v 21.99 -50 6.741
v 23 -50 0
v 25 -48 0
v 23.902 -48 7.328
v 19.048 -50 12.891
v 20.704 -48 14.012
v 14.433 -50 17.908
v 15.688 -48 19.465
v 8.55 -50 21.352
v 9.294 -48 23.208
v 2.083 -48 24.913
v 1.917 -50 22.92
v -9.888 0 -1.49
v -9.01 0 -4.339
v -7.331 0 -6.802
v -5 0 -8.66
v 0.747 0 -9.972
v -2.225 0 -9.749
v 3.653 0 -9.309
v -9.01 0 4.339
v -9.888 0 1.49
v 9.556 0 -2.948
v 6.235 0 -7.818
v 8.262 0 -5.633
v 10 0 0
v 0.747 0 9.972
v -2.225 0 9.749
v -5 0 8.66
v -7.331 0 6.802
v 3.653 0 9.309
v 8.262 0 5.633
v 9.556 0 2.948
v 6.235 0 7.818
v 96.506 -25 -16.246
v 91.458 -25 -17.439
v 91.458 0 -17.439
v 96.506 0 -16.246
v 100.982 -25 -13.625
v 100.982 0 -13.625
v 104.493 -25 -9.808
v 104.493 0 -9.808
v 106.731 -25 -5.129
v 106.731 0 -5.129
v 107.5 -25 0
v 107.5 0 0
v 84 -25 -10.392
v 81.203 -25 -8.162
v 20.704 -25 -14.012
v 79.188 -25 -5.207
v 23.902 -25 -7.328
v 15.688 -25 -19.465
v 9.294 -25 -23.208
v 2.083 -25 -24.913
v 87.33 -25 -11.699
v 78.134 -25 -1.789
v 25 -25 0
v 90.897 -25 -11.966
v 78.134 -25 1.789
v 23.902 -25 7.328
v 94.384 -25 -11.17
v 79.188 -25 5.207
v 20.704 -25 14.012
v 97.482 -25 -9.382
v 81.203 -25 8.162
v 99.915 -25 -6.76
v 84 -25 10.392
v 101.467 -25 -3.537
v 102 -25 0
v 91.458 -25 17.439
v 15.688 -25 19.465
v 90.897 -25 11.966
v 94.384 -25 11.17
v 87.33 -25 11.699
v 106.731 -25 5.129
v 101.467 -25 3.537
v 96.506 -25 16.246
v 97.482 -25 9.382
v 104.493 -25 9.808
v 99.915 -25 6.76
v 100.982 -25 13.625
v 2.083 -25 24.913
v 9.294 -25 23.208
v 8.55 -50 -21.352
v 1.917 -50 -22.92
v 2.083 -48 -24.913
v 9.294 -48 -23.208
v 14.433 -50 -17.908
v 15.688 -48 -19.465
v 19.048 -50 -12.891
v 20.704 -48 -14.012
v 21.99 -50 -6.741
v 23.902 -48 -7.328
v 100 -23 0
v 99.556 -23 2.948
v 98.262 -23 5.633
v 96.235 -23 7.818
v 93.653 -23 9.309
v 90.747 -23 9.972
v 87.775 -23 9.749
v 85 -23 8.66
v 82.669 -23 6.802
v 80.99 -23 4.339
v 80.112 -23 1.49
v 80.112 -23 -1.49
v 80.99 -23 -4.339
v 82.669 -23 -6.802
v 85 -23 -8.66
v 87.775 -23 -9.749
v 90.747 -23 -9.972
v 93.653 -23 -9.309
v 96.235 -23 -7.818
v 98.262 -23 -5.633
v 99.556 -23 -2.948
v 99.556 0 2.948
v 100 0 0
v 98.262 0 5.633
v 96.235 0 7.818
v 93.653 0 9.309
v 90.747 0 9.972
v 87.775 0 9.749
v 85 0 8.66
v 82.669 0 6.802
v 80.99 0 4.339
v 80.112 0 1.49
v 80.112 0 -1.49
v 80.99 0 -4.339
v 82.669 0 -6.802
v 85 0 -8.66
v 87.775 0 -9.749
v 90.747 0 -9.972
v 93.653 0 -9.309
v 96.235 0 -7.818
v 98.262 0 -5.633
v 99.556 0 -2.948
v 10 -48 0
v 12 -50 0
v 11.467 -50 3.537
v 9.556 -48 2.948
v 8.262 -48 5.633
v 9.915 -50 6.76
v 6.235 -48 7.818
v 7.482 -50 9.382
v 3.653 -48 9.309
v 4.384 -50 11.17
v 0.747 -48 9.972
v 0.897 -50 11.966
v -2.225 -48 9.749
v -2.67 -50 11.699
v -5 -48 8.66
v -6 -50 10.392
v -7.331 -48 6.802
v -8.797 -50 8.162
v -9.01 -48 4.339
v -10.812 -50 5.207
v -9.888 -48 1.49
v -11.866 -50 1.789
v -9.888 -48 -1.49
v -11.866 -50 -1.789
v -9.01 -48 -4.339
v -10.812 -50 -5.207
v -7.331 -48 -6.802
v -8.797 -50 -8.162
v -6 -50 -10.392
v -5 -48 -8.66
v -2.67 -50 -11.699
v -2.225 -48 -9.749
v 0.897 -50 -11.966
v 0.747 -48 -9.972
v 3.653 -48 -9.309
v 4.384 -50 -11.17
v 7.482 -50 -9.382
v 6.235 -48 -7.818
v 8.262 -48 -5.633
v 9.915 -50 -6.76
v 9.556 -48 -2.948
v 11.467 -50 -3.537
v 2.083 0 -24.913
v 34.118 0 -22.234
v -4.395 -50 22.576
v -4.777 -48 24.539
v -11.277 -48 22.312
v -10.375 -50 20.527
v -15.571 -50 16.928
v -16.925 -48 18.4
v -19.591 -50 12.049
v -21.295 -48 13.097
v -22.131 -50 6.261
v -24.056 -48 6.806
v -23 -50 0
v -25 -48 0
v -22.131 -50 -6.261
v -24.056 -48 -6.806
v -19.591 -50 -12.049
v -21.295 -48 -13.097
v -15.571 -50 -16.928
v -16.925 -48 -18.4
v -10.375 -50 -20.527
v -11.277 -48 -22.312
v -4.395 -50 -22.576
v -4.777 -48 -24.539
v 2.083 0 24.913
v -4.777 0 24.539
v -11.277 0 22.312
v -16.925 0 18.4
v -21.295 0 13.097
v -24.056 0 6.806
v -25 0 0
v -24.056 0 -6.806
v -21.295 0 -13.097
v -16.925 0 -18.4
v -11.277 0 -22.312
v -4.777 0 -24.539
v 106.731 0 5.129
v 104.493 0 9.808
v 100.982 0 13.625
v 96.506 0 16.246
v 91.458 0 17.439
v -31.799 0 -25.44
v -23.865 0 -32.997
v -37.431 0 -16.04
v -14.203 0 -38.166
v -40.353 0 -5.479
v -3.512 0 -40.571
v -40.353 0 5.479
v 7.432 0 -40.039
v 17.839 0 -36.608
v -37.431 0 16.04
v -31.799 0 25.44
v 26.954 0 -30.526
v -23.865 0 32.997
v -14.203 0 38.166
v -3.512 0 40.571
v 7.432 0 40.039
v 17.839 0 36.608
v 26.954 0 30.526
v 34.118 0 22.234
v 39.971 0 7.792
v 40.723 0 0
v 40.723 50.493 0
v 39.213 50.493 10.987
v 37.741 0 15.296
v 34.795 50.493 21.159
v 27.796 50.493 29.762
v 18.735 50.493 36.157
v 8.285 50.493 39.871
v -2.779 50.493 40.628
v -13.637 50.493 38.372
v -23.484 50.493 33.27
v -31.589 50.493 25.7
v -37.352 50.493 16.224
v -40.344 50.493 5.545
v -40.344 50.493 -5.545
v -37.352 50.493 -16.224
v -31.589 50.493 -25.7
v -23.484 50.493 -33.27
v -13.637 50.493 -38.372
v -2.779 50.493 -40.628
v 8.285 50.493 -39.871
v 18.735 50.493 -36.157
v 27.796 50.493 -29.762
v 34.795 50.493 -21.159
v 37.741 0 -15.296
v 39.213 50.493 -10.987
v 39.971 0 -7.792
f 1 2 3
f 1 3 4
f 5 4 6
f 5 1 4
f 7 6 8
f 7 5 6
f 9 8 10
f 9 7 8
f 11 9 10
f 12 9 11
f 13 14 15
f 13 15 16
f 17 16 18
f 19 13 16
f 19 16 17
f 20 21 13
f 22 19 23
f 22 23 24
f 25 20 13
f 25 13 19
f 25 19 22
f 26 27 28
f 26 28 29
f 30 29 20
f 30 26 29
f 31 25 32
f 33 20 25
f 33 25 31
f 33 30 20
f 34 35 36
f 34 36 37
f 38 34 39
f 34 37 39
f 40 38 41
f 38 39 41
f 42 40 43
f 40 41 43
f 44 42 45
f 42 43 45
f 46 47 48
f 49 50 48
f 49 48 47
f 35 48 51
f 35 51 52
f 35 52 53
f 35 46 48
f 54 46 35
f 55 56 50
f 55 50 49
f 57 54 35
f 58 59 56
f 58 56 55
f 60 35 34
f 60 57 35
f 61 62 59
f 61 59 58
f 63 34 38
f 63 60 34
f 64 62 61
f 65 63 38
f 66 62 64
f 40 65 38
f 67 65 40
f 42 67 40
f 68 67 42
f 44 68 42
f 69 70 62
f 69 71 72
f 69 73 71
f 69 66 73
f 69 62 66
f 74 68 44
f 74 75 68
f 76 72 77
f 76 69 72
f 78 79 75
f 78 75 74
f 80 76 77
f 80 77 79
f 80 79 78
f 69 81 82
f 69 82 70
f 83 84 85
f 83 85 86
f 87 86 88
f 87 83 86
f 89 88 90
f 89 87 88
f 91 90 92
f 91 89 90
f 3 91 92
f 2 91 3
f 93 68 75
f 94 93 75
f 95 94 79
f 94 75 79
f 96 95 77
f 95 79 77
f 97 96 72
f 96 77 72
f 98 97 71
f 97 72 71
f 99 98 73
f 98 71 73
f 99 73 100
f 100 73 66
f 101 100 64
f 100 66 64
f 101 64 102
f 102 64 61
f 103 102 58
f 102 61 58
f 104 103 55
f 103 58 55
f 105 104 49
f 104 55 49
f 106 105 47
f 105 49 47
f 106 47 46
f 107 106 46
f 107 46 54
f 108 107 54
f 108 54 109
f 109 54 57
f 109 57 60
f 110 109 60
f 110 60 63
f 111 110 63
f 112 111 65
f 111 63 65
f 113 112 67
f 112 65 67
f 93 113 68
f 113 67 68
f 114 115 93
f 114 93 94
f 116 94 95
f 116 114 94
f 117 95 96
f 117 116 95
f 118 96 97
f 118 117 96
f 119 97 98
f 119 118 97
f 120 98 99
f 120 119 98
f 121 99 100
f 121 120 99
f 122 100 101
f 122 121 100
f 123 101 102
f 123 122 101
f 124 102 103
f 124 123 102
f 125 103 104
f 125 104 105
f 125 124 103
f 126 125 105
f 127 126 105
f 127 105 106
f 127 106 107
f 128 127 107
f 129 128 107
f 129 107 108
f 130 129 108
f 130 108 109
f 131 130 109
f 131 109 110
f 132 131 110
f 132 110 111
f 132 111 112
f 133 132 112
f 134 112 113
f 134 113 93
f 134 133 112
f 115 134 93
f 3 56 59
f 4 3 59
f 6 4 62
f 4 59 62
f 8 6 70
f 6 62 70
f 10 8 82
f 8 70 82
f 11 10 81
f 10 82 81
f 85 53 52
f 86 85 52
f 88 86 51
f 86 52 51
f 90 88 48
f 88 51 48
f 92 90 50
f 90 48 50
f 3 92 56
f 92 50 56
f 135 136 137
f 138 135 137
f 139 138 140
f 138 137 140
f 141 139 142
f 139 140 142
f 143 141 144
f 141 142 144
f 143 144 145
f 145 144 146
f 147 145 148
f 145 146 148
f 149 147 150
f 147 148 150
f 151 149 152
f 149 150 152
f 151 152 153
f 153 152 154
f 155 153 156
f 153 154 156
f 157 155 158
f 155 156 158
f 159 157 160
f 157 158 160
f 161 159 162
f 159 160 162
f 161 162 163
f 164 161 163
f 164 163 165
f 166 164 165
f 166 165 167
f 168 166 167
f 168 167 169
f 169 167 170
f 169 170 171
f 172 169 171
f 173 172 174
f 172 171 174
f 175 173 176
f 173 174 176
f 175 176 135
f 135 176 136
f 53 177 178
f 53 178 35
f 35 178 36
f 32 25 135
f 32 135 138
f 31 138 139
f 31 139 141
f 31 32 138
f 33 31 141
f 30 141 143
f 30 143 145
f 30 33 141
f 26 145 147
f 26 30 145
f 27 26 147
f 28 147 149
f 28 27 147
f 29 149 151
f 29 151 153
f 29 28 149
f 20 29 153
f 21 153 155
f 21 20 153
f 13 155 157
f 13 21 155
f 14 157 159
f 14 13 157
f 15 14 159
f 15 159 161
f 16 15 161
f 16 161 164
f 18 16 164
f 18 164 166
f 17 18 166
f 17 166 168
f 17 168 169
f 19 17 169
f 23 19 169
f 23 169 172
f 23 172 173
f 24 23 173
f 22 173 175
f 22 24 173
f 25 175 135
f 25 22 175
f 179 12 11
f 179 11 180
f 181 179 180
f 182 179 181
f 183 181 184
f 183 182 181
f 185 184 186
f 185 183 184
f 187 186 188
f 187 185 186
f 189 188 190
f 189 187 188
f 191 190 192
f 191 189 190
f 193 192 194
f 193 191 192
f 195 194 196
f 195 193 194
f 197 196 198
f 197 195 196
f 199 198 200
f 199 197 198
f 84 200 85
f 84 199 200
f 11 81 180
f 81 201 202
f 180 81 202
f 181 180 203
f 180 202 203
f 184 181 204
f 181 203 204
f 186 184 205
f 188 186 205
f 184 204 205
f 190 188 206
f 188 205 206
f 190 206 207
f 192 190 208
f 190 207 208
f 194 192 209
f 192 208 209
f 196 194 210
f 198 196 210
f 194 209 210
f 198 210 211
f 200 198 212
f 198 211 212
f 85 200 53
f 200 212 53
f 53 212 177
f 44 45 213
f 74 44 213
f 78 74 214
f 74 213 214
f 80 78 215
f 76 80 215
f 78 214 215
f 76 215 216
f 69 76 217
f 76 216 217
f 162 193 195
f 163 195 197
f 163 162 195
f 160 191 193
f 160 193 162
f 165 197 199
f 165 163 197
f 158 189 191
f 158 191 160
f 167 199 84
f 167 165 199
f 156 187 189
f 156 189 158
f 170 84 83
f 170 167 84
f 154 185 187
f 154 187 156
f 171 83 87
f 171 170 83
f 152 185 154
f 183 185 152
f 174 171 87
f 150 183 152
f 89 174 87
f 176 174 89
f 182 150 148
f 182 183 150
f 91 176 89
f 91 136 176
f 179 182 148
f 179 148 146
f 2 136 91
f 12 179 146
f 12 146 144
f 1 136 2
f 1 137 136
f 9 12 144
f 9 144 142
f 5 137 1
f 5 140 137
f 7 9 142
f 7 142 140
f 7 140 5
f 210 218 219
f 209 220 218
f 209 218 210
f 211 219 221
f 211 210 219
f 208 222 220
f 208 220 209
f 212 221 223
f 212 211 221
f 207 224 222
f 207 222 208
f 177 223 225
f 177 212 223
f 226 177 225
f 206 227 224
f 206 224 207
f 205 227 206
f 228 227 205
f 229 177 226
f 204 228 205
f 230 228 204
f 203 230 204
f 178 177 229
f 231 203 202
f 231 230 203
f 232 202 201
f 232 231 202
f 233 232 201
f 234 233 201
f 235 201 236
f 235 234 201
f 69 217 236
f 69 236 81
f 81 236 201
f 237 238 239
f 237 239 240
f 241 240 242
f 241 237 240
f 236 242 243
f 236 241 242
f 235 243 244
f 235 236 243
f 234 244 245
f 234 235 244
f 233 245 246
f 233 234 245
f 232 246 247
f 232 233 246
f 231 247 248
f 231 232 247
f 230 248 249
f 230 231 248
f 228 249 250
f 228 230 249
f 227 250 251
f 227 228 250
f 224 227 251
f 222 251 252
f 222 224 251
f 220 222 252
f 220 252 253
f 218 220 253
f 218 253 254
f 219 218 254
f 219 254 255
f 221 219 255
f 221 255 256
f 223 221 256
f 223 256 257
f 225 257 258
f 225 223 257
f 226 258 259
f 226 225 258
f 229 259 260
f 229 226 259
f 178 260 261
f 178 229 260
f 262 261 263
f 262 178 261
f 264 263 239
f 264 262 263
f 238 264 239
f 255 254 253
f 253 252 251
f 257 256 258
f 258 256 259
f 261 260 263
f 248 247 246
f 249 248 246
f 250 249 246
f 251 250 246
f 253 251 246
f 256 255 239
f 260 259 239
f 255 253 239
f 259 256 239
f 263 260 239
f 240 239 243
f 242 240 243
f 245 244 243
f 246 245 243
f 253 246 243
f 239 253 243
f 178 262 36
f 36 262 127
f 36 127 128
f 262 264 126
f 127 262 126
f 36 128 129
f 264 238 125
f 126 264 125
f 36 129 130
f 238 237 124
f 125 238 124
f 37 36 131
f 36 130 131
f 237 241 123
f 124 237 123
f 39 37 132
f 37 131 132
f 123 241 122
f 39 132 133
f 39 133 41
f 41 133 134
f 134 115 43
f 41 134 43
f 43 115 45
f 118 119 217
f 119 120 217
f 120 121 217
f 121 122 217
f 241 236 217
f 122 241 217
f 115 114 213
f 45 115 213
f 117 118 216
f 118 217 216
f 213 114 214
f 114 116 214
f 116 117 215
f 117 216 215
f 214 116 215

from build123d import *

# Parameters (mm, degrees)
F0_R     = 10
F1_DEPTH = 25
F2_DEPTH = 50
F3_SIZE  = 2
F4_R     = 40.723122
F5_DEPTH = 50.493211


with BuildPart() as f1:
    # F0 (on Front) → F1 (new body)
    with BuildSketch(Plane.XZ):
        with BuildLine():
            ThreePointArc((2.083333, -24.913043), (18.399502, -16.92508), (25, 0))
            ThreePointArc((25, 0), (18.399502, 16.92508), (2.083333, 24.913043))
            ThreePointArc((2.083333, 24.913043), (-25, 0), (2.083333, -24.913043))
        make_face()
        Circle(F0_R, mode=Mode.SUBTRACT)
        with BuildLine():
            ThreePointArc((2.083333, 24.913043), (18.399502, 16.92508), (25, 0))
            ThreePointArc((25, 0), (18.399502, -16.92508), (2.083333, -24.913043))
            Line((2.083333, -24.913043), (91.458333, -17.43913))
            ThreePointArc((91.458333, -17.43913), (72.5, 0), (91.458333, 17.43913))
            Line((91.458333, 17.43913), (2.083333, 24.913043))
        make_face()
        with BuildLine():
            ThreePointArc((107.5, 0), (102.879651, 11.847556), (91.458333, 17.43913))
            ThreePointArc((91.458333, 17.43913), (72.5, 0), (91.458333, -17.43913))
            ThreePointArc((91.458333, -17.43913), (102.879651, -11.847556), (107.5, 0))
        make_face()
        with Locations((90, 0)):
            Circle(F0_R, mode=Mode.SUBTRACT)
    extrude(amount=F1_DEPTH)

    # F0 (on Front) → F2 (join)
    with BuildSketch(Plane.XZ):
        with BuildLine():
            ThreePointArc((2.083333, -24.913043), (18.399502, -16.92508), (25, 0))
            ThreePointArc((25, 0), (18.399502, 16.92508), (2.083333, 24.913043))
            ThreePointArc((2.083333, 24.913043), (-25, 0), (2.083333, -24.913043))
        make_face()
        Circle(F0_R, mode=Mode.SUBTRACT)
    extrude(amount=F2_DEPTH)

    # F3
    f3_edges = [f1.edges().sort_by_distance(p)[0] for p in [
        (-2.083333, -50, 24.913043),
        (-10, -50, 0),
        (80, -25, 0),
    ]]
    chamfer(f3_edges, length=F3_SIZE)

    # F4 (on Front) → F5 (join)
    with BuildSketch(Plane.XZ):
        Circle(F4_R)
    extrude(amount=-F5_DEPTH)


solid = f1.part
